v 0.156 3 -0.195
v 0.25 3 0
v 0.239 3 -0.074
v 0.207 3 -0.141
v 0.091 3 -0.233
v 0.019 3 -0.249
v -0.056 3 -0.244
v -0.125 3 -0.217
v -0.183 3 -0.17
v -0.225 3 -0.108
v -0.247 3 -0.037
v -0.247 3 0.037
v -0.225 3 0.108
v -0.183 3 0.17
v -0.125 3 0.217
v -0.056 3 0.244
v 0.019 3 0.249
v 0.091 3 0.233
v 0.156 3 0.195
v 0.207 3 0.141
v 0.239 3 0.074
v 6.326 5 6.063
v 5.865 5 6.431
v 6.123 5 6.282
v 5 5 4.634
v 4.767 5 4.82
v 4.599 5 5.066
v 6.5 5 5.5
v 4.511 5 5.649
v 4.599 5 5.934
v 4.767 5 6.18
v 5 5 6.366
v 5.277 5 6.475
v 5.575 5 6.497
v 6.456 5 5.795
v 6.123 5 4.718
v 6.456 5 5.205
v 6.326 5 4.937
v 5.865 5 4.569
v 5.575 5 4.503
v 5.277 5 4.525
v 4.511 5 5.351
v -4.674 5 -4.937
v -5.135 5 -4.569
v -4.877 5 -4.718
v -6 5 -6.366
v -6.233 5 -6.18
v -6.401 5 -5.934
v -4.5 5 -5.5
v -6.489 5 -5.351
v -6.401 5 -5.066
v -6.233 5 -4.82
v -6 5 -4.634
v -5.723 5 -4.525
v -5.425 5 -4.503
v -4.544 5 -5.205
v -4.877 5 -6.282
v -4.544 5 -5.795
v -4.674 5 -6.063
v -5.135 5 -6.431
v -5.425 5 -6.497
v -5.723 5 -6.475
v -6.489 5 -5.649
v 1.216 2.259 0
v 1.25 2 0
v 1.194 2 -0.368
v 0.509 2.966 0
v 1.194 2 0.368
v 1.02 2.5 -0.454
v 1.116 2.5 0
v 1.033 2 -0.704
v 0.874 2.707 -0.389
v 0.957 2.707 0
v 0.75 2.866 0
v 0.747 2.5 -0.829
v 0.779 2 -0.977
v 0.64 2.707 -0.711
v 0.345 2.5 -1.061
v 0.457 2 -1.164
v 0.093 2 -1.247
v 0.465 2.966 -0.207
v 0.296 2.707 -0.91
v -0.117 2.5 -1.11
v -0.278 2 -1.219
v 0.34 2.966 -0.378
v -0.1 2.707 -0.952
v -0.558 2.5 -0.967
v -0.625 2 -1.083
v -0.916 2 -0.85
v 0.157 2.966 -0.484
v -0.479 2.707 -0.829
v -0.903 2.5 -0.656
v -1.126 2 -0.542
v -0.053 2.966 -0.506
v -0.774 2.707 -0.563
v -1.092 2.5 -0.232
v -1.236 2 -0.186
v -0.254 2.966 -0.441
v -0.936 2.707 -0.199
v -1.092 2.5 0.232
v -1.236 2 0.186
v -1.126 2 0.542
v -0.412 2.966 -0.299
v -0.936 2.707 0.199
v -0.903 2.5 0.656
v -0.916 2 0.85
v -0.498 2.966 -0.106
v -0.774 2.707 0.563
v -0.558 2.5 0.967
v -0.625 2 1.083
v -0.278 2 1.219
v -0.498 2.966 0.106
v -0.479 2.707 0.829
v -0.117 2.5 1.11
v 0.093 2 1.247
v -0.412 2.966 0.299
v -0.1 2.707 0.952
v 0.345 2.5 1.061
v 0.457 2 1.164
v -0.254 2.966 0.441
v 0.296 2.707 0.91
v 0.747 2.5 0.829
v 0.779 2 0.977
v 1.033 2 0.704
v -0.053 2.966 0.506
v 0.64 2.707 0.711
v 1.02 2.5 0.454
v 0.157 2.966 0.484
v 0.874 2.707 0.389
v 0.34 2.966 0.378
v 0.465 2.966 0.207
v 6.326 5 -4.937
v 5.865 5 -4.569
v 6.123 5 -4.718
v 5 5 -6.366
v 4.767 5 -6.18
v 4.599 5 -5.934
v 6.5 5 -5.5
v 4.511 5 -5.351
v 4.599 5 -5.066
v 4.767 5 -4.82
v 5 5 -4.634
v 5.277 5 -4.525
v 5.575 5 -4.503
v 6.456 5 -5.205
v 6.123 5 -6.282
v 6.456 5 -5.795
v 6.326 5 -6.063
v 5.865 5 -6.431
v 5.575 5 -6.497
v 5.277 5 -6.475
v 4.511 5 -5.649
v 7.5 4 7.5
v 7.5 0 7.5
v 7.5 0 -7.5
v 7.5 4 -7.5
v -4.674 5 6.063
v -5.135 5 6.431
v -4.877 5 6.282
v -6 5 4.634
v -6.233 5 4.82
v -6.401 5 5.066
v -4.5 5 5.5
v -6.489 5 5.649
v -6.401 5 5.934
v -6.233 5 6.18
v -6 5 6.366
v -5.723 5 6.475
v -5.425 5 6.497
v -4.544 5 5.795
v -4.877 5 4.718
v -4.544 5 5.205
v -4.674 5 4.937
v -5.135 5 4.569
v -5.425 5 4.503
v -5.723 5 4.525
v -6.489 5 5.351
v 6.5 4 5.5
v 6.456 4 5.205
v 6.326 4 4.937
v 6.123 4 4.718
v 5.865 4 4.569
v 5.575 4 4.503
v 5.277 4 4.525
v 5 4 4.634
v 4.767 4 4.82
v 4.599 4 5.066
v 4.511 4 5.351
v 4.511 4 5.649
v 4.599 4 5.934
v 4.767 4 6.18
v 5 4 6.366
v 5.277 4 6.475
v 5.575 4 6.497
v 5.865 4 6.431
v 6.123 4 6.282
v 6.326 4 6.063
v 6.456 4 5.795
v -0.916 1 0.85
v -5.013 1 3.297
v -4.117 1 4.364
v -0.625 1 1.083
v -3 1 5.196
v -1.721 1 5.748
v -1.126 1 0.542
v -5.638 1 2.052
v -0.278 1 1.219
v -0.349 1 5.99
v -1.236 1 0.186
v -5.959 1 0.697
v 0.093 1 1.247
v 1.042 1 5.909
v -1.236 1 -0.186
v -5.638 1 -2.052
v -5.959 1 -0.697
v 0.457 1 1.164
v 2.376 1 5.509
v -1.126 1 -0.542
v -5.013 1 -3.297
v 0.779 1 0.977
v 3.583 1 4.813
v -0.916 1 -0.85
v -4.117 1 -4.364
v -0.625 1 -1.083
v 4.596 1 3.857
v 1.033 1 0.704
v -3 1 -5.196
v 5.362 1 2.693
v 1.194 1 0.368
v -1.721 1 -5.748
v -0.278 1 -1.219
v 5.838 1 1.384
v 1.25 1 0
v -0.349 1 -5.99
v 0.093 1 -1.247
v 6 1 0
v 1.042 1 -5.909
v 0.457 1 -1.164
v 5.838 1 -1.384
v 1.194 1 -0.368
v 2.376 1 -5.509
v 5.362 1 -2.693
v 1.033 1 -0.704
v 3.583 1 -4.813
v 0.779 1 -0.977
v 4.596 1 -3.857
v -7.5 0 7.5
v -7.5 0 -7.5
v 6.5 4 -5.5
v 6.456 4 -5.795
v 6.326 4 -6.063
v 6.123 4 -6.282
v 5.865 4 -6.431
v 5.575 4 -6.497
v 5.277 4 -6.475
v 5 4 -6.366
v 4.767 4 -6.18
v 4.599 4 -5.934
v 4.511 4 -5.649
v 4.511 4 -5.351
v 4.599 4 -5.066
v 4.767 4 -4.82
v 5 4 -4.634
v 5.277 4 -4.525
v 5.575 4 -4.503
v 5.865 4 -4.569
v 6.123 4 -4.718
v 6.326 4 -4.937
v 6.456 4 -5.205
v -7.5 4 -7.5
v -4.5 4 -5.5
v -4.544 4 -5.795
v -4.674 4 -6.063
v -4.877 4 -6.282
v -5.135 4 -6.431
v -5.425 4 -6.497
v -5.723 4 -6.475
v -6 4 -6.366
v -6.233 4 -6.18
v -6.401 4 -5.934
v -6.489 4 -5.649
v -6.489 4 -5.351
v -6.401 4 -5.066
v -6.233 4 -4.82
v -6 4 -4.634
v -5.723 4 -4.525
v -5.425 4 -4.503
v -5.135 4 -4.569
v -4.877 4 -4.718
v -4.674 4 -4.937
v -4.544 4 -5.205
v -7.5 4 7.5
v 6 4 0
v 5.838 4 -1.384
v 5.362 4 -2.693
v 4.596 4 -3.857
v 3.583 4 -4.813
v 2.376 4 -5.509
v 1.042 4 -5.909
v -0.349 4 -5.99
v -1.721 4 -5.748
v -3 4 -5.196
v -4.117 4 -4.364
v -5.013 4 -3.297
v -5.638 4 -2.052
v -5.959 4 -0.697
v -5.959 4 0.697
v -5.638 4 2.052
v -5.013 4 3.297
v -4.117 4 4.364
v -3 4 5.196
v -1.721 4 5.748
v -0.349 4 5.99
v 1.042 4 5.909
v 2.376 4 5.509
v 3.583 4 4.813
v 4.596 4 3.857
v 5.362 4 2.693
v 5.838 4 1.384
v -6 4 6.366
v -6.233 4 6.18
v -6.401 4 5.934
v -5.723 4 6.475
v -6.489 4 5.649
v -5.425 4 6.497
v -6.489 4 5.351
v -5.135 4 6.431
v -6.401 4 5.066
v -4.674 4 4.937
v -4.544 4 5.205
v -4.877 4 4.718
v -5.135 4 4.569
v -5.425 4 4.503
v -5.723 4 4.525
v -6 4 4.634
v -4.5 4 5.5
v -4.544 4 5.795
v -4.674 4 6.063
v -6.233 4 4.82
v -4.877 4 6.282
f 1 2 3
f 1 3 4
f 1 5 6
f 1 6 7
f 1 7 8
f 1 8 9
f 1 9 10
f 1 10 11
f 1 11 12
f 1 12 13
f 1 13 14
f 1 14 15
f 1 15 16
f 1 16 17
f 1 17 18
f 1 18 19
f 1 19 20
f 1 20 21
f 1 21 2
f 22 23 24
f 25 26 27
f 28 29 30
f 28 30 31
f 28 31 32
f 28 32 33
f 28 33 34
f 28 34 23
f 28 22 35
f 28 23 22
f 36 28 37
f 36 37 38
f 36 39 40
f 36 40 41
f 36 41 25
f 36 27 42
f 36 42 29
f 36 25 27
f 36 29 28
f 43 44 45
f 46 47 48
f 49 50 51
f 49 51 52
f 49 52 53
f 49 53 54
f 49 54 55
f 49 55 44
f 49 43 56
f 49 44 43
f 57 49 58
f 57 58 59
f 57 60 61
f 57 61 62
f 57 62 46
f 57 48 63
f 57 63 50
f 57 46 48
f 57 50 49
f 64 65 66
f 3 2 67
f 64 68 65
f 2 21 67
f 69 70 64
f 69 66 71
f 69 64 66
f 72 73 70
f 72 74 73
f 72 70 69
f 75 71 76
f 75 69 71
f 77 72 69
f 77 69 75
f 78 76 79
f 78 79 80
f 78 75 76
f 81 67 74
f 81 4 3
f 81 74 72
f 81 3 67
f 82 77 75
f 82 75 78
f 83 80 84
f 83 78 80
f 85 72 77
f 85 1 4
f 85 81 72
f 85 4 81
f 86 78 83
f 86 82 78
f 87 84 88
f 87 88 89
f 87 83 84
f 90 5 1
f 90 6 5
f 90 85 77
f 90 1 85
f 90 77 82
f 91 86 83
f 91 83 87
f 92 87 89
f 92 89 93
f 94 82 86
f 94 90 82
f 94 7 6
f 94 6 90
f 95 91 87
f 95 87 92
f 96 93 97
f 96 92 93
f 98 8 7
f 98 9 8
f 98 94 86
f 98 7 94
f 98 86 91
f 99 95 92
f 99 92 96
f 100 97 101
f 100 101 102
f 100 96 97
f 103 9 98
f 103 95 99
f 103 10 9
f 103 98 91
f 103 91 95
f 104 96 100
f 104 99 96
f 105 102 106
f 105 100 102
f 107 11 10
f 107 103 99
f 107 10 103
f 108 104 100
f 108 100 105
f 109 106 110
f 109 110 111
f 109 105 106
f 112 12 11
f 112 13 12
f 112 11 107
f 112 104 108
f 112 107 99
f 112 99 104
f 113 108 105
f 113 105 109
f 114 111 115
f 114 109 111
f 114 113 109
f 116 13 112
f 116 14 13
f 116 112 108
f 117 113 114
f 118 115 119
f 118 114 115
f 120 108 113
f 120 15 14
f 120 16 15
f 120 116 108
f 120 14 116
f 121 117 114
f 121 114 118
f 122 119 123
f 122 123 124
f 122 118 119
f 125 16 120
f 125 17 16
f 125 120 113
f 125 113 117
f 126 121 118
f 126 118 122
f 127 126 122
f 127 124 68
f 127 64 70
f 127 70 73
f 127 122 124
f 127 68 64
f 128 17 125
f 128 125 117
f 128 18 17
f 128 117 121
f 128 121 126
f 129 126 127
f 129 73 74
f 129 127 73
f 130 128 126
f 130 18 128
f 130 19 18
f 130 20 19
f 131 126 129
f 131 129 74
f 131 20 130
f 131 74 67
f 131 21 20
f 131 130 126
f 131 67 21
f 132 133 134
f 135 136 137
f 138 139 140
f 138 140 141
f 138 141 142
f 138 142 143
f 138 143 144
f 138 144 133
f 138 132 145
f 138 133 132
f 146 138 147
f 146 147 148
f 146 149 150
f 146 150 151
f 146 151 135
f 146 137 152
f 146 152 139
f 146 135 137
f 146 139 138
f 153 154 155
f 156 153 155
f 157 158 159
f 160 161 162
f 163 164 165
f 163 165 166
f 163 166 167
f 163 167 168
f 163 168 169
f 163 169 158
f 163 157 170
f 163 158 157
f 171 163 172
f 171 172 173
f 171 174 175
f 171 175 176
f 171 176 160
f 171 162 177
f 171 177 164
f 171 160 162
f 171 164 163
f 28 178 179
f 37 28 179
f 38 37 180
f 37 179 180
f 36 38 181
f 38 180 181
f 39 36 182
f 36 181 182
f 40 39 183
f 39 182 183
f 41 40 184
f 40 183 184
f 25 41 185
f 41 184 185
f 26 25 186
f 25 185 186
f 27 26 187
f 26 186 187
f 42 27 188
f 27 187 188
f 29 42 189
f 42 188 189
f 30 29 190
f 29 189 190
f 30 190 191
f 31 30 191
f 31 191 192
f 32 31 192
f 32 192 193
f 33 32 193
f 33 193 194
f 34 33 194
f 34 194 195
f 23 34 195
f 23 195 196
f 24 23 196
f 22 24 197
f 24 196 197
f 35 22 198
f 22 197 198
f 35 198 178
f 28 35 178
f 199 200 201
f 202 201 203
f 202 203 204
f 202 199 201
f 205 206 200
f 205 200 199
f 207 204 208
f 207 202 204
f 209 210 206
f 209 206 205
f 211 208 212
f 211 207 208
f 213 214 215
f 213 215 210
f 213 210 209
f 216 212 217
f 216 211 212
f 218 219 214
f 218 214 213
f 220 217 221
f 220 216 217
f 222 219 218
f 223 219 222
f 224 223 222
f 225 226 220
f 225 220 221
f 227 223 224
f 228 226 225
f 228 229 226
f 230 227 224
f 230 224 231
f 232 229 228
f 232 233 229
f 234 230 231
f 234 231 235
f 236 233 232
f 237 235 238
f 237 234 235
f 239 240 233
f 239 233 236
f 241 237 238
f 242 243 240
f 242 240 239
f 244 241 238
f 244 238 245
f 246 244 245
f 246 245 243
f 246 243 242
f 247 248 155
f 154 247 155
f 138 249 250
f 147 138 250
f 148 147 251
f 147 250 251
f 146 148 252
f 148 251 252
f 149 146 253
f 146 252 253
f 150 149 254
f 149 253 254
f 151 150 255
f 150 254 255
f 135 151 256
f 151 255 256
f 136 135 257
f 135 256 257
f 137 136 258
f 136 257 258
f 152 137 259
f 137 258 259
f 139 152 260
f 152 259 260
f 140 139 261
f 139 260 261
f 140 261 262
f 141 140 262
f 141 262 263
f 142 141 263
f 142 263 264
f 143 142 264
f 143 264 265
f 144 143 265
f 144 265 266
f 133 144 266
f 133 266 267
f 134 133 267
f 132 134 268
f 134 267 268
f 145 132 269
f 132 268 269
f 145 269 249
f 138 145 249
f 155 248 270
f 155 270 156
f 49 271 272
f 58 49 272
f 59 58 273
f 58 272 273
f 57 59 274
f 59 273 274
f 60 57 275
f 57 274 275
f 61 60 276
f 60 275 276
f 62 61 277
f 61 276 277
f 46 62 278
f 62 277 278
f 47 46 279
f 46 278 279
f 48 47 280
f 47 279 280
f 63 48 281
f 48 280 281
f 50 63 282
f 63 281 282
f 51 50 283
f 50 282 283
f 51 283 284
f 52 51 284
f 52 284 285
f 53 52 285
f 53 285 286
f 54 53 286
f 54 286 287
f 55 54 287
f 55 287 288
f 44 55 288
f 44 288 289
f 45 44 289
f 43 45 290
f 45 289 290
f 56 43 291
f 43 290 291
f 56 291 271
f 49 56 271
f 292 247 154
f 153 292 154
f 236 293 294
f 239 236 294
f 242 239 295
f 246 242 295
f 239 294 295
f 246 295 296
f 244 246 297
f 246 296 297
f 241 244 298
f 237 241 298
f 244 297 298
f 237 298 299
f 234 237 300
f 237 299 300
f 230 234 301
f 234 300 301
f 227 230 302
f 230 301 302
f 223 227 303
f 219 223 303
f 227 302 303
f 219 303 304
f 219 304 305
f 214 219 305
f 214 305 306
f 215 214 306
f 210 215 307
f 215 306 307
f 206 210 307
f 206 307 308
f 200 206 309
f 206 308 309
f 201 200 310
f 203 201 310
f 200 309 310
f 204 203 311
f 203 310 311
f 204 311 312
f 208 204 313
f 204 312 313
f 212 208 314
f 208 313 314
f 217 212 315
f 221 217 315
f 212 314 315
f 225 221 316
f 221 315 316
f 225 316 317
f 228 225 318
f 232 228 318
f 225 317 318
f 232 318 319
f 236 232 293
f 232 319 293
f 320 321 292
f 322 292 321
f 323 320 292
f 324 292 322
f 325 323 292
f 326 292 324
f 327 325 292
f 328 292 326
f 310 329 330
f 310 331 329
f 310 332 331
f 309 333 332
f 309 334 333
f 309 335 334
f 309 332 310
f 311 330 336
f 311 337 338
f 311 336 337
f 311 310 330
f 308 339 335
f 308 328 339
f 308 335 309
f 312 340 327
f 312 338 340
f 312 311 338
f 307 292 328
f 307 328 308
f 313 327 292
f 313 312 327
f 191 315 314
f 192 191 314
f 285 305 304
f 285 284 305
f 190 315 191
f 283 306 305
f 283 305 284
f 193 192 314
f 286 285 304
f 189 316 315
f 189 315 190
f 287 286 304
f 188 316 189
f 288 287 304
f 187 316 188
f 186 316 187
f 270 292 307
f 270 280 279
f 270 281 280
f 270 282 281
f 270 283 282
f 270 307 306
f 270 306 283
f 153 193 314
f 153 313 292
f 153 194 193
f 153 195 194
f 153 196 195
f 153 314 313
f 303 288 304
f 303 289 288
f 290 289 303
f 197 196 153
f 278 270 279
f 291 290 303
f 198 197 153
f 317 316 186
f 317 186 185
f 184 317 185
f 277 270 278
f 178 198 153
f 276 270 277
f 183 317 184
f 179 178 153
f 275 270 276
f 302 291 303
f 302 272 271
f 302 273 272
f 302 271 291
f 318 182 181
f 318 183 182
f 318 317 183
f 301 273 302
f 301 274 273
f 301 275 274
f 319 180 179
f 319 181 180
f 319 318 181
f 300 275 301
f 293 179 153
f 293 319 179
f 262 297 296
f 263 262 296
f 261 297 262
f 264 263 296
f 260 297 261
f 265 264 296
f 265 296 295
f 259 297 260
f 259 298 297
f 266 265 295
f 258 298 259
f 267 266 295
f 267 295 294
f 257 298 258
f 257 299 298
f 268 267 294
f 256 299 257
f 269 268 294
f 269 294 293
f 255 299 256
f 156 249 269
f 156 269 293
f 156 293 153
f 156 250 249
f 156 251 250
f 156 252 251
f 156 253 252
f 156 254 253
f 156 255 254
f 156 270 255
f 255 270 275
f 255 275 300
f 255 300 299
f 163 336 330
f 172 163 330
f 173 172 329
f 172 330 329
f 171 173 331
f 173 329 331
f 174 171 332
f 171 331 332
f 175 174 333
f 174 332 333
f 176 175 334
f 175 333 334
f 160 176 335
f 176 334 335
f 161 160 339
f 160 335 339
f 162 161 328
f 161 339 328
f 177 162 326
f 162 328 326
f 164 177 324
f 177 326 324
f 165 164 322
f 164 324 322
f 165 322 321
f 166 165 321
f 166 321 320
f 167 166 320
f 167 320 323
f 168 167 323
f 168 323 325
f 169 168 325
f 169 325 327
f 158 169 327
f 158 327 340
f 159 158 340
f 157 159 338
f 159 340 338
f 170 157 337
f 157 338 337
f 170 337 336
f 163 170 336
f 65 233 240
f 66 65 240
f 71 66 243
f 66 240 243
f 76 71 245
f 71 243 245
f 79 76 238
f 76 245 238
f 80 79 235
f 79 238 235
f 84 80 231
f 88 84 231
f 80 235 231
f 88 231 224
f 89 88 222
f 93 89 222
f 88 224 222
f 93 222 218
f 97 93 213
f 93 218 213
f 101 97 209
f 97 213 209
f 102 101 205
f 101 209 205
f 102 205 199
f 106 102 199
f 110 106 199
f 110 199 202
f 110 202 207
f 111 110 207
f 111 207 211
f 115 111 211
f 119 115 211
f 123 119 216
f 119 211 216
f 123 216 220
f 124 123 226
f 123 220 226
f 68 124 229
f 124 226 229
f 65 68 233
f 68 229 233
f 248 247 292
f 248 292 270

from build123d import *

# Parameters (mm, degrees)
SKETCH1_W           = 15
SKETCH1_H           = 15
BOSS_EXTRUDE2_DEPTH = 4
SKETCH4_R           = 6
CUT_EXTRUDE4_DEPTH  = 3
SKETCH5_R           = 1.25
BOSS_EXTRUDE3_DEPTH = 2
FILLET2_R           = 1
SKETCH6_R           = 1
BOSS_EXTRUDE4_DEPTH = 1


with BuildPart() as part:
    # Sketch1 → Boss-Extrude2 (new body)
    with BuildSketch(Plane(origin=(0, 0, 0), x_dir=(1, 0, 0), z_dir=(0, 1, 0))):
        Rectangle(SKETCH1_W, SKETCH1_H)
    extrude(amount=BOSS_EXTRUDE2_DEPTH)

    # Sketch4 → Cut-Extrude4 (cut)
    with BuildSketch(Plane(origin=(0, 4, 0), x_dir=(1, 0, 0), z_dir=(0, 1, 0))):
        Circle(SKETCH4_R)
    extrude(amount=-CUT_EXTRUDE4_DEPTH, mode=Mode.SUBTRACT)

    # Sketch5 → Boss-Extrude3 (add)
    with BuildSketch(Plane(origin=(0, 1, 0), x_dir=(1, 0, 0), z_dir=(0, 1, 0))):
        Circle(SKETCH5_R)
    extrude(amount=BOSS_EXTRUDE3_DEPTH)

    # Fillet2
    fillet2_edges = [part.edges().sort_by_distance(p)[0] for p in [
        (-1.25, 3, 0),
    ]]
    fillet(fillet2_edges, radius=FILLET2_R)

    # Sketch6 → Boss-Extrude4 (add)
    with BuildSketch(Plane(origin=(0, 4, 0), x_dir=(1, 0, 0), z_dir=(0, 1, 0))):
        with Locations((-5.5, 5.5)):
            Circle(SKETCH6_R)
        with Locations((5.5, 5.5)):
            Circle(SKETCH6_R)
        with Locations((-5.5, -5.5)):
            Circle(SKETCH6_R)
        with Locations((5.5, -5.5)):
            Circle(SKETCH6_R)
    extrude(amount=BOSS_EXTRUDE4_DEPTH)


solid = part.part
